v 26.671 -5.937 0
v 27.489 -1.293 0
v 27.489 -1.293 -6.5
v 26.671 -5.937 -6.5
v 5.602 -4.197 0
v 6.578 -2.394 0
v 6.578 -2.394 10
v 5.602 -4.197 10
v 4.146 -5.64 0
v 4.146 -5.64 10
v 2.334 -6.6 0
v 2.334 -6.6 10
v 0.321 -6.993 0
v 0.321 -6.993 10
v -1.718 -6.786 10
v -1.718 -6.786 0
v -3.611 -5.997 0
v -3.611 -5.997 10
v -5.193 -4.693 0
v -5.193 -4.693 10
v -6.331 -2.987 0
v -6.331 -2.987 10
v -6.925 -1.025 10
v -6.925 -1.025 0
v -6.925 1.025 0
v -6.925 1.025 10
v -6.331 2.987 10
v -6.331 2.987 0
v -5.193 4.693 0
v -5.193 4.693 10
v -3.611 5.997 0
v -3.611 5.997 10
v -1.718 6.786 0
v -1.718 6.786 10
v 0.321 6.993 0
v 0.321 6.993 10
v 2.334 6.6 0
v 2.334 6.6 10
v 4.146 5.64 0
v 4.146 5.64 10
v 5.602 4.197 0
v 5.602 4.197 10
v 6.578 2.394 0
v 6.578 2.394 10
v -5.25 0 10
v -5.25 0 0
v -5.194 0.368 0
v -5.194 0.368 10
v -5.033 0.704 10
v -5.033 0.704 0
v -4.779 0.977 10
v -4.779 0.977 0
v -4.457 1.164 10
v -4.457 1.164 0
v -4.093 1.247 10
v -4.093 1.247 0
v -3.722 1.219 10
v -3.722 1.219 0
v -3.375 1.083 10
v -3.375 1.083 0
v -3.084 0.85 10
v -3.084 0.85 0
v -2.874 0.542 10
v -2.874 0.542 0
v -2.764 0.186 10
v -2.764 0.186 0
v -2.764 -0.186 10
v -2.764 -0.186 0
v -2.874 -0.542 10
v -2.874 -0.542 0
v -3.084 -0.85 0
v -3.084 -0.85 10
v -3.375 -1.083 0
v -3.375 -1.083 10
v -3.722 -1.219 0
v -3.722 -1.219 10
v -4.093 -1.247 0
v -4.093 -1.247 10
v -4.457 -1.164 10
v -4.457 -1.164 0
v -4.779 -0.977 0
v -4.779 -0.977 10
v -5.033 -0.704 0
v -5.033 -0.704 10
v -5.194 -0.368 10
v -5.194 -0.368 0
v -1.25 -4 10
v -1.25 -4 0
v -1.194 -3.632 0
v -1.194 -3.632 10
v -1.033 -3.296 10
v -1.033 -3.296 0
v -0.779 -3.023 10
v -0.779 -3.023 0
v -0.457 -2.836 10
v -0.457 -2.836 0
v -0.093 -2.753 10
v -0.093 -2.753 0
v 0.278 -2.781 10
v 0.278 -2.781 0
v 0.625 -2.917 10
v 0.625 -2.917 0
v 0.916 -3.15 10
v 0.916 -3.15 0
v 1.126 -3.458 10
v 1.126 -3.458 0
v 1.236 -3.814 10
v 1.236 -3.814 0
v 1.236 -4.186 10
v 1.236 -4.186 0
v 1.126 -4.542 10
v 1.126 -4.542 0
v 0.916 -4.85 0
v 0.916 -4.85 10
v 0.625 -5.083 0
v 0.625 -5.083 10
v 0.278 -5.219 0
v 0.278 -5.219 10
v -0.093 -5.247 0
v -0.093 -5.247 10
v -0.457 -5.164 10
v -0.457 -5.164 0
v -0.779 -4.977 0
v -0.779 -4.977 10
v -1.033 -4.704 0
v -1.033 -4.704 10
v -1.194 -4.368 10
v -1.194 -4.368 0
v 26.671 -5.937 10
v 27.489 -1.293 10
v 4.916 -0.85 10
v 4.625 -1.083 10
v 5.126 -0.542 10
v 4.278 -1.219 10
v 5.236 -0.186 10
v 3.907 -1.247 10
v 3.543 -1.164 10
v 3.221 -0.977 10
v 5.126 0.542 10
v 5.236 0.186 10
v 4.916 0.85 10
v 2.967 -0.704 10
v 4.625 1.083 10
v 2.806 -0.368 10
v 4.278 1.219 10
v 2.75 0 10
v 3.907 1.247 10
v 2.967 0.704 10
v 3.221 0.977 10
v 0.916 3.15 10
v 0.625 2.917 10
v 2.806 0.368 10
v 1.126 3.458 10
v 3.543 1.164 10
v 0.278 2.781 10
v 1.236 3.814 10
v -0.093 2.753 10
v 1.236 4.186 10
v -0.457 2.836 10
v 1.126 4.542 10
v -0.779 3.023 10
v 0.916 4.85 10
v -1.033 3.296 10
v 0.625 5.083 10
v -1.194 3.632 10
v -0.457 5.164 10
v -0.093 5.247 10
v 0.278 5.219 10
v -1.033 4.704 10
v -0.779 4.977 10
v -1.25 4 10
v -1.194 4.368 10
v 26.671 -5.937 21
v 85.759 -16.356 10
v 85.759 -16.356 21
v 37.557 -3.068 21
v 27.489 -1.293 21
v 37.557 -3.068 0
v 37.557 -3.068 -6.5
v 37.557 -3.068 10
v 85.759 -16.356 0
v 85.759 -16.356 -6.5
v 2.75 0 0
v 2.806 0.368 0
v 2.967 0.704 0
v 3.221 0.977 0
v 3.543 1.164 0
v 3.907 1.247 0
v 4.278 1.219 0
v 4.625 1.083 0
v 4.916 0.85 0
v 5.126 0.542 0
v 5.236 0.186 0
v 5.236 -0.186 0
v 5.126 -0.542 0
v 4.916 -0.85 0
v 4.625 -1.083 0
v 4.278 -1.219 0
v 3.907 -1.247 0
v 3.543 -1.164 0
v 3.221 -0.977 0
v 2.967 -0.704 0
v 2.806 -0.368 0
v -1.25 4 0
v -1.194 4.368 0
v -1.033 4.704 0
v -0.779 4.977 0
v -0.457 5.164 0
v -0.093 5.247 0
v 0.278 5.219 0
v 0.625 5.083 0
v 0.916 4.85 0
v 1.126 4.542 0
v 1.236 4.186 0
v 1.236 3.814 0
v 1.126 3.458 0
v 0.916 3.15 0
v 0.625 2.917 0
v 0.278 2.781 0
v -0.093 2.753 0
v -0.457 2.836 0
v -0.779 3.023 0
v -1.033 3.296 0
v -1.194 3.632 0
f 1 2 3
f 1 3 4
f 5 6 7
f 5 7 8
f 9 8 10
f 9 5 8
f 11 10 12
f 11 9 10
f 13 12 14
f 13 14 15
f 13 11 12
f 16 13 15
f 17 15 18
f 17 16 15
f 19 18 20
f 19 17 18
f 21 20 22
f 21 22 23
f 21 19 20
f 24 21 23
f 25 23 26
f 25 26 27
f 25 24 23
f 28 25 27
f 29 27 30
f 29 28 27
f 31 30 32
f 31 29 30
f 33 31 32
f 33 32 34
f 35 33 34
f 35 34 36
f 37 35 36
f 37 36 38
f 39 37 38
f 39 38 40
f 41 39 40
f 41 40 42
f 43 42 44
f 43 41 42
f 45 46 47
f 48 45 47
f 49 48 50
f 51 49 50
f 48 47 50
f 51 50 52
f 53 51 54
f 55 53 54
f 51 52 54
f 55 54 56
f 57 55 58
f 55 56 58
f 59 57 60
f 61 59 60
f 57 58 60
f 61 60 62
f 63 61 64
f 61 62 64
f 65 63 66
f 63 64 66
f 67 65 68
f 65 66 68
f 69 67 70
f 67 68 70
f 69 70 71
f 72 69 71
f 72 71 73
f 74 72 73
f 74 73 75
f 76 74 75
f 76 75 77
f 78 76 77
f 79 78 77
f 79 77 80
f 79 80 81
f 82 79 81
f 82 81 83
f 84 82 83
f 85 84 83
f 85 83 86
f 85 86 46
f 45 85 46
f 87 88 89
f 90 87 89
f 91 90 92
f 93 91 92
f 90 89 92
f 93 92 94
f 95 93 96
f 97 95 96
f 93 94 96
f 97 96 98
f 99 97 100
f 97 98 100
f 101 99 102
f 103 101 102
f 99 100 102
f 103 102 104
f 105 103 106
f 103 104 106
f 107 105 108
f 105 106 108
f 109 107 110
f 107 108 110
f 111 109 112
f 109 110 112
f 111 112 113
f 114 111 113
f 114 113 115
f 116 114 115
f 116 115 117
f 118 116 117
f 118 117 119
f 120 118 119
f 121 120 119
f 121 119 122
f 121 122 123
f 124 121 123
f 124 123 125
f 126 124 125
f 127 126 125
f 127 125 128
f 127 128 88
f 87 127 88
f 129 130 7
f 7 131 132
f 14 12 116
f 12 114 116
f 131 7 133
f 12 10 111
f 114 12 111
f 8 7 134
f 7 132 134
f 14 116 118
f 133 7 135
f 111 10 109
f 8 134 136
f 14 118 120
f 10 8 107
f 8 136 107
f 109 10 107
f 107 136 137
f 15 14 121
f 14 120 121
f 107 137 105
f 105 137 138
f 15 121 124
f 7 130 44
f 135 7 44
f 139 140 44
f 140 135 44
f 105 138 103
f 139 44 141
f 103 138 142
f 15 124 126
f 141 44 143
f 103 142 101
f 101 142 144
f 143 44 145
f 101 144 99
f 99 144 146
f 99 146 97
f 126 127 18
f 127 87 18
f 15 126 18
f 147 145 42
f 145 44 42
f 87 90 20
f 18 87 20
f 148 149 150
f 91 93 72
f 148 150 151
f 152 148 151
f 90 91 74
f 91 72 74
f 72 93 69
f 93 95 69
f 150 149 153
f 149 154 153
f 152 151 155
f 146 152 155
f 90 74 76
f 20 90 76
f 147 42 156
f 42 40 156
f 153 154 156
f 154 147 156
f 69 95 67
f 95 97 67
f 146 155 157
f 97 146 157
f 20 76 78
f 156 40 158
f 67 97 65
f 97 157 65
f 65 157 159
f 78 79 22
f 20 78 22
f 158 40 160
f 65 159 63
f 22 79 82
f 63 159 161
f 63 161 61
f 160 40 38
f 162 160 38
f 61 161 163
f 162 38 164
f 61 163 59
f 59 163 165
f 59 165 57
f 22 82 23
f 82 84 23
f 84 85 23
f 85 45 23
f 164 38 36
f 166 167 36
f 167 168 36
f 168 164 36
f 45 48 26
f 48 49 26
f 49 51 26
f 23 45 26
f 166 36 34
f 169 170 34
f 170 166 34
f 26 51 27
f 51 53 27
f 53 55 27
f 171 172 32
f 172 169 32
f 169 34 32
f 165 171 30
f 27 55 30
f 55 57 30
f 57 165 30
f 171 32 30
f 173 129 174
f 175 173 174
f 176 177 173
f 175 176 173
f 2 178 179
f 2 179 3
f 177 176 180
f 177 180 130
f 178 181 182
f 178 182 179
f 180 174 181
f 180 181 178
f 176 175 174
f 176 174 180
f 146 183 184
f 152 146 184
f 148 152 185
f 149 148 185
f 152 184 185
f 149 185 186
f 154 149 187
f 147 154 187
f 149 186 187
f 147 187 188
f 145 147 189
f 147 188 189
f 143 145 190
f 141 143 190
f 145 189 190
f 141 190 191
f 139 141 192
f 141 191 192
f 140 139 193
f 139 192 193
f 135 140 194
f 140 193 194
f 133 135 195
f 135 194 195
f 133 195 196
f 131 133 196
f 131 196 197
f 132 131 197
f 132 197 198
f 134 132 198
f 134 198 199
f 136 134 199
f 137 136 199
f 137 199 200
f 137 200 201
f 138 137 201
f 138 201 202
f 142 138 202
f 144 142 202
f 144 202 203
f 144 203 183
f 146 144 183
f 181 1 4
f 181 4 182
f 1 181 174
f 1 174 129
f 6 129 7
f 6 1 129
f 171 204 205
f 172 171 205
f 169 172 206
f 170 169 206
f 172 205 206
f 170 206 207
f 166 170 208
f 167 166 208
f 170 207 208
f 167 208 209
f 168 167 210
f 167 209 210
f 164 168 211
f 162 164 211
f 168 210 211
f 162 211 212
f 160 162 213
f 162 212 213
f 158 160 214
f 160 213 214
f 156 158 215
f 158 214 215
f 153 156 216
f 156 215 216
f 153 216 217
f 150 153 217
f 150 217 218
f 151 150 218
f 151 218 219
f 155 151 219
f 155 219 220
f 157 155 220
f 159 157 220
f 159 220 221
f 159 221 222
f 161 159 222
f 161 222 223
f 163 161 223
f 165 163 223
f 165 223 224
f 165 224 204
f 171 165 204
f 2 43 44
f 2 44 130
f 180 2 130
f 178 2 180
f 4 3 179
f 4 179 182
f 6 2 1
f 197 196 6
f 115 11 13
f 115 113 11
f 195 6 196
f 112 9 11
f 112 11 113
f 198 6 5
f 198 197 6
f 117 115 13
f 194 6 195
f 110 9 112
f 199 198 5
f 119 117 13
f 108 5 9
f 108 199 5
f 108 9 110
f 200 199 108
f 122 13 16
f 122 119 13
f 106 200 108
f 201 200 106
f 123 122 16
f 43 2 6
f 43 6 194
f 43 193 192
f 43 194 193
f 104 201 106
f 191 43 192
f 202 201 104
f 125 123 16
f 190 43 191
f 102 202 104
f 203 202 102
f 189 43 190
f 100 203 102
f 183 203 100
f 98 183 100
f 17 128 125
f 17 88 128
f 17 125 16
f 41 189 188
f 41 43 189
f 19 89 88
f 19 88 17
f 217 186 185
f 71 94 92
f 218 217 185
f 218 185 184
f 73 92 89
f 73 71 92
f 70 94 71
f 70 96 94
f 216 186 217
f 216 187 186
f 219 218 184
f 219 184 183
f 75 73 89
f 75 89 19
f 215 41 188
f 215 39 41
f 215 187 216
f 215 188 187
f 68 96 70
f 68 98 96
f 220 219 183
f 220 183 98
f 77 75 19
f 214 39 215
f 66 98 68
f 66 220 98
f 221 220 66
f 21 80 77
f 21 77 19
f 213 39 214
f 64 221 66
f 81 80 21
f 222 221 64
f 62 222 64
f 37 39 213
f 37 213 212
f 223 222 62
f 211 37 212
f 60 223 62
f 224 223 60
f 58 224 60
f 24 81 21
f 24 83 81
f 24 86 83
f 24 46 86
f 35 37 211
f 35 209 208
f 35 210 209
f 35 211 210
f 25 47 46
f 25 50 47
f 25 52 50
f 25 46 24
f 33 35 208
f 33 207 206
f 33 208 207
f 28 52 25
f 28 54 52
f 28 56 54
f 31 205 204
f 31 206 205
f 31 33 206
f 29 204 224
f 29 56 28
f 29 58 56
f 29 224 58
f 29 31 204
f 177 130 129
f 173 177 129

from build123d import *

# Parameters (mm, degrees)
EXTRUDE_1_DEPTH      = 10
EXTRUDE_2_DEPTH      = 11
EXTRUDE_2_DEPTH_BACK = 16.5
CUT_EXTRUDE_1_DEPTH  = 28.5
HOLE_WIZARD_M3_1_D   = 2.5


with BuildPart() as part:
    # 스케치1 → 보스-돌출1 (new body)
    with BuildSketch(Plane.XY):
        with BuildLine():
            Line((6.577848346, 2.394141003), (86.577848346, -11.712017453))
            Line((86.577848346, -11.712017453), (85.759003896, -16.355915091))
            Line((85.759003896, -16.355915091), (6.577848346, -2.394141003))
            ThreePointArc((6.577848346, -2.394141003), (-7, 0), (6.577848346, 2.394141003))
        make_face()
    extrude(amount=EXTRUDE_1_DEPTH)

    # 스케치2 → 보스-돌출2 (add, two sides)
    with BuildSketch(Plane.XY.offset(10)) as extrude_2_sk:
        Polygon((86.577848346, -11.712017453), (27.489383165, -1.293126793), (26.670538716, -5.937024431), (85.759003896, -16.355915091), align=None)
    extrude(amount=EXTRUDE_2_DEPTH)
    extrude(extrude_2_sk.sketch, amount=-EXTRUDE_2_DEPTH_BACK)

    # 스케치4 → 컷-돌출1 (cut, through all)
    with BuildSketch(Plane.XY.offset(21)):
        Polygon((86.577848346, -11.712017453), (85.759003896, -16.355915091), (37.556934536, -3.06830773), align=None)
    extrude(amount=-CUT_EXTRUDE_1_DEPTH, mode=Mode.SUBTRACT)

    # M3 나사 구멍1 (through all)
    with Locations(Plane.XY.offset(10)):
        with Locations((-4, 0), (0, 4), (4, 0), (0, -4)):
            Hole(HOLE_WIZARD_M3_1_D / 2)


solid = part.part
